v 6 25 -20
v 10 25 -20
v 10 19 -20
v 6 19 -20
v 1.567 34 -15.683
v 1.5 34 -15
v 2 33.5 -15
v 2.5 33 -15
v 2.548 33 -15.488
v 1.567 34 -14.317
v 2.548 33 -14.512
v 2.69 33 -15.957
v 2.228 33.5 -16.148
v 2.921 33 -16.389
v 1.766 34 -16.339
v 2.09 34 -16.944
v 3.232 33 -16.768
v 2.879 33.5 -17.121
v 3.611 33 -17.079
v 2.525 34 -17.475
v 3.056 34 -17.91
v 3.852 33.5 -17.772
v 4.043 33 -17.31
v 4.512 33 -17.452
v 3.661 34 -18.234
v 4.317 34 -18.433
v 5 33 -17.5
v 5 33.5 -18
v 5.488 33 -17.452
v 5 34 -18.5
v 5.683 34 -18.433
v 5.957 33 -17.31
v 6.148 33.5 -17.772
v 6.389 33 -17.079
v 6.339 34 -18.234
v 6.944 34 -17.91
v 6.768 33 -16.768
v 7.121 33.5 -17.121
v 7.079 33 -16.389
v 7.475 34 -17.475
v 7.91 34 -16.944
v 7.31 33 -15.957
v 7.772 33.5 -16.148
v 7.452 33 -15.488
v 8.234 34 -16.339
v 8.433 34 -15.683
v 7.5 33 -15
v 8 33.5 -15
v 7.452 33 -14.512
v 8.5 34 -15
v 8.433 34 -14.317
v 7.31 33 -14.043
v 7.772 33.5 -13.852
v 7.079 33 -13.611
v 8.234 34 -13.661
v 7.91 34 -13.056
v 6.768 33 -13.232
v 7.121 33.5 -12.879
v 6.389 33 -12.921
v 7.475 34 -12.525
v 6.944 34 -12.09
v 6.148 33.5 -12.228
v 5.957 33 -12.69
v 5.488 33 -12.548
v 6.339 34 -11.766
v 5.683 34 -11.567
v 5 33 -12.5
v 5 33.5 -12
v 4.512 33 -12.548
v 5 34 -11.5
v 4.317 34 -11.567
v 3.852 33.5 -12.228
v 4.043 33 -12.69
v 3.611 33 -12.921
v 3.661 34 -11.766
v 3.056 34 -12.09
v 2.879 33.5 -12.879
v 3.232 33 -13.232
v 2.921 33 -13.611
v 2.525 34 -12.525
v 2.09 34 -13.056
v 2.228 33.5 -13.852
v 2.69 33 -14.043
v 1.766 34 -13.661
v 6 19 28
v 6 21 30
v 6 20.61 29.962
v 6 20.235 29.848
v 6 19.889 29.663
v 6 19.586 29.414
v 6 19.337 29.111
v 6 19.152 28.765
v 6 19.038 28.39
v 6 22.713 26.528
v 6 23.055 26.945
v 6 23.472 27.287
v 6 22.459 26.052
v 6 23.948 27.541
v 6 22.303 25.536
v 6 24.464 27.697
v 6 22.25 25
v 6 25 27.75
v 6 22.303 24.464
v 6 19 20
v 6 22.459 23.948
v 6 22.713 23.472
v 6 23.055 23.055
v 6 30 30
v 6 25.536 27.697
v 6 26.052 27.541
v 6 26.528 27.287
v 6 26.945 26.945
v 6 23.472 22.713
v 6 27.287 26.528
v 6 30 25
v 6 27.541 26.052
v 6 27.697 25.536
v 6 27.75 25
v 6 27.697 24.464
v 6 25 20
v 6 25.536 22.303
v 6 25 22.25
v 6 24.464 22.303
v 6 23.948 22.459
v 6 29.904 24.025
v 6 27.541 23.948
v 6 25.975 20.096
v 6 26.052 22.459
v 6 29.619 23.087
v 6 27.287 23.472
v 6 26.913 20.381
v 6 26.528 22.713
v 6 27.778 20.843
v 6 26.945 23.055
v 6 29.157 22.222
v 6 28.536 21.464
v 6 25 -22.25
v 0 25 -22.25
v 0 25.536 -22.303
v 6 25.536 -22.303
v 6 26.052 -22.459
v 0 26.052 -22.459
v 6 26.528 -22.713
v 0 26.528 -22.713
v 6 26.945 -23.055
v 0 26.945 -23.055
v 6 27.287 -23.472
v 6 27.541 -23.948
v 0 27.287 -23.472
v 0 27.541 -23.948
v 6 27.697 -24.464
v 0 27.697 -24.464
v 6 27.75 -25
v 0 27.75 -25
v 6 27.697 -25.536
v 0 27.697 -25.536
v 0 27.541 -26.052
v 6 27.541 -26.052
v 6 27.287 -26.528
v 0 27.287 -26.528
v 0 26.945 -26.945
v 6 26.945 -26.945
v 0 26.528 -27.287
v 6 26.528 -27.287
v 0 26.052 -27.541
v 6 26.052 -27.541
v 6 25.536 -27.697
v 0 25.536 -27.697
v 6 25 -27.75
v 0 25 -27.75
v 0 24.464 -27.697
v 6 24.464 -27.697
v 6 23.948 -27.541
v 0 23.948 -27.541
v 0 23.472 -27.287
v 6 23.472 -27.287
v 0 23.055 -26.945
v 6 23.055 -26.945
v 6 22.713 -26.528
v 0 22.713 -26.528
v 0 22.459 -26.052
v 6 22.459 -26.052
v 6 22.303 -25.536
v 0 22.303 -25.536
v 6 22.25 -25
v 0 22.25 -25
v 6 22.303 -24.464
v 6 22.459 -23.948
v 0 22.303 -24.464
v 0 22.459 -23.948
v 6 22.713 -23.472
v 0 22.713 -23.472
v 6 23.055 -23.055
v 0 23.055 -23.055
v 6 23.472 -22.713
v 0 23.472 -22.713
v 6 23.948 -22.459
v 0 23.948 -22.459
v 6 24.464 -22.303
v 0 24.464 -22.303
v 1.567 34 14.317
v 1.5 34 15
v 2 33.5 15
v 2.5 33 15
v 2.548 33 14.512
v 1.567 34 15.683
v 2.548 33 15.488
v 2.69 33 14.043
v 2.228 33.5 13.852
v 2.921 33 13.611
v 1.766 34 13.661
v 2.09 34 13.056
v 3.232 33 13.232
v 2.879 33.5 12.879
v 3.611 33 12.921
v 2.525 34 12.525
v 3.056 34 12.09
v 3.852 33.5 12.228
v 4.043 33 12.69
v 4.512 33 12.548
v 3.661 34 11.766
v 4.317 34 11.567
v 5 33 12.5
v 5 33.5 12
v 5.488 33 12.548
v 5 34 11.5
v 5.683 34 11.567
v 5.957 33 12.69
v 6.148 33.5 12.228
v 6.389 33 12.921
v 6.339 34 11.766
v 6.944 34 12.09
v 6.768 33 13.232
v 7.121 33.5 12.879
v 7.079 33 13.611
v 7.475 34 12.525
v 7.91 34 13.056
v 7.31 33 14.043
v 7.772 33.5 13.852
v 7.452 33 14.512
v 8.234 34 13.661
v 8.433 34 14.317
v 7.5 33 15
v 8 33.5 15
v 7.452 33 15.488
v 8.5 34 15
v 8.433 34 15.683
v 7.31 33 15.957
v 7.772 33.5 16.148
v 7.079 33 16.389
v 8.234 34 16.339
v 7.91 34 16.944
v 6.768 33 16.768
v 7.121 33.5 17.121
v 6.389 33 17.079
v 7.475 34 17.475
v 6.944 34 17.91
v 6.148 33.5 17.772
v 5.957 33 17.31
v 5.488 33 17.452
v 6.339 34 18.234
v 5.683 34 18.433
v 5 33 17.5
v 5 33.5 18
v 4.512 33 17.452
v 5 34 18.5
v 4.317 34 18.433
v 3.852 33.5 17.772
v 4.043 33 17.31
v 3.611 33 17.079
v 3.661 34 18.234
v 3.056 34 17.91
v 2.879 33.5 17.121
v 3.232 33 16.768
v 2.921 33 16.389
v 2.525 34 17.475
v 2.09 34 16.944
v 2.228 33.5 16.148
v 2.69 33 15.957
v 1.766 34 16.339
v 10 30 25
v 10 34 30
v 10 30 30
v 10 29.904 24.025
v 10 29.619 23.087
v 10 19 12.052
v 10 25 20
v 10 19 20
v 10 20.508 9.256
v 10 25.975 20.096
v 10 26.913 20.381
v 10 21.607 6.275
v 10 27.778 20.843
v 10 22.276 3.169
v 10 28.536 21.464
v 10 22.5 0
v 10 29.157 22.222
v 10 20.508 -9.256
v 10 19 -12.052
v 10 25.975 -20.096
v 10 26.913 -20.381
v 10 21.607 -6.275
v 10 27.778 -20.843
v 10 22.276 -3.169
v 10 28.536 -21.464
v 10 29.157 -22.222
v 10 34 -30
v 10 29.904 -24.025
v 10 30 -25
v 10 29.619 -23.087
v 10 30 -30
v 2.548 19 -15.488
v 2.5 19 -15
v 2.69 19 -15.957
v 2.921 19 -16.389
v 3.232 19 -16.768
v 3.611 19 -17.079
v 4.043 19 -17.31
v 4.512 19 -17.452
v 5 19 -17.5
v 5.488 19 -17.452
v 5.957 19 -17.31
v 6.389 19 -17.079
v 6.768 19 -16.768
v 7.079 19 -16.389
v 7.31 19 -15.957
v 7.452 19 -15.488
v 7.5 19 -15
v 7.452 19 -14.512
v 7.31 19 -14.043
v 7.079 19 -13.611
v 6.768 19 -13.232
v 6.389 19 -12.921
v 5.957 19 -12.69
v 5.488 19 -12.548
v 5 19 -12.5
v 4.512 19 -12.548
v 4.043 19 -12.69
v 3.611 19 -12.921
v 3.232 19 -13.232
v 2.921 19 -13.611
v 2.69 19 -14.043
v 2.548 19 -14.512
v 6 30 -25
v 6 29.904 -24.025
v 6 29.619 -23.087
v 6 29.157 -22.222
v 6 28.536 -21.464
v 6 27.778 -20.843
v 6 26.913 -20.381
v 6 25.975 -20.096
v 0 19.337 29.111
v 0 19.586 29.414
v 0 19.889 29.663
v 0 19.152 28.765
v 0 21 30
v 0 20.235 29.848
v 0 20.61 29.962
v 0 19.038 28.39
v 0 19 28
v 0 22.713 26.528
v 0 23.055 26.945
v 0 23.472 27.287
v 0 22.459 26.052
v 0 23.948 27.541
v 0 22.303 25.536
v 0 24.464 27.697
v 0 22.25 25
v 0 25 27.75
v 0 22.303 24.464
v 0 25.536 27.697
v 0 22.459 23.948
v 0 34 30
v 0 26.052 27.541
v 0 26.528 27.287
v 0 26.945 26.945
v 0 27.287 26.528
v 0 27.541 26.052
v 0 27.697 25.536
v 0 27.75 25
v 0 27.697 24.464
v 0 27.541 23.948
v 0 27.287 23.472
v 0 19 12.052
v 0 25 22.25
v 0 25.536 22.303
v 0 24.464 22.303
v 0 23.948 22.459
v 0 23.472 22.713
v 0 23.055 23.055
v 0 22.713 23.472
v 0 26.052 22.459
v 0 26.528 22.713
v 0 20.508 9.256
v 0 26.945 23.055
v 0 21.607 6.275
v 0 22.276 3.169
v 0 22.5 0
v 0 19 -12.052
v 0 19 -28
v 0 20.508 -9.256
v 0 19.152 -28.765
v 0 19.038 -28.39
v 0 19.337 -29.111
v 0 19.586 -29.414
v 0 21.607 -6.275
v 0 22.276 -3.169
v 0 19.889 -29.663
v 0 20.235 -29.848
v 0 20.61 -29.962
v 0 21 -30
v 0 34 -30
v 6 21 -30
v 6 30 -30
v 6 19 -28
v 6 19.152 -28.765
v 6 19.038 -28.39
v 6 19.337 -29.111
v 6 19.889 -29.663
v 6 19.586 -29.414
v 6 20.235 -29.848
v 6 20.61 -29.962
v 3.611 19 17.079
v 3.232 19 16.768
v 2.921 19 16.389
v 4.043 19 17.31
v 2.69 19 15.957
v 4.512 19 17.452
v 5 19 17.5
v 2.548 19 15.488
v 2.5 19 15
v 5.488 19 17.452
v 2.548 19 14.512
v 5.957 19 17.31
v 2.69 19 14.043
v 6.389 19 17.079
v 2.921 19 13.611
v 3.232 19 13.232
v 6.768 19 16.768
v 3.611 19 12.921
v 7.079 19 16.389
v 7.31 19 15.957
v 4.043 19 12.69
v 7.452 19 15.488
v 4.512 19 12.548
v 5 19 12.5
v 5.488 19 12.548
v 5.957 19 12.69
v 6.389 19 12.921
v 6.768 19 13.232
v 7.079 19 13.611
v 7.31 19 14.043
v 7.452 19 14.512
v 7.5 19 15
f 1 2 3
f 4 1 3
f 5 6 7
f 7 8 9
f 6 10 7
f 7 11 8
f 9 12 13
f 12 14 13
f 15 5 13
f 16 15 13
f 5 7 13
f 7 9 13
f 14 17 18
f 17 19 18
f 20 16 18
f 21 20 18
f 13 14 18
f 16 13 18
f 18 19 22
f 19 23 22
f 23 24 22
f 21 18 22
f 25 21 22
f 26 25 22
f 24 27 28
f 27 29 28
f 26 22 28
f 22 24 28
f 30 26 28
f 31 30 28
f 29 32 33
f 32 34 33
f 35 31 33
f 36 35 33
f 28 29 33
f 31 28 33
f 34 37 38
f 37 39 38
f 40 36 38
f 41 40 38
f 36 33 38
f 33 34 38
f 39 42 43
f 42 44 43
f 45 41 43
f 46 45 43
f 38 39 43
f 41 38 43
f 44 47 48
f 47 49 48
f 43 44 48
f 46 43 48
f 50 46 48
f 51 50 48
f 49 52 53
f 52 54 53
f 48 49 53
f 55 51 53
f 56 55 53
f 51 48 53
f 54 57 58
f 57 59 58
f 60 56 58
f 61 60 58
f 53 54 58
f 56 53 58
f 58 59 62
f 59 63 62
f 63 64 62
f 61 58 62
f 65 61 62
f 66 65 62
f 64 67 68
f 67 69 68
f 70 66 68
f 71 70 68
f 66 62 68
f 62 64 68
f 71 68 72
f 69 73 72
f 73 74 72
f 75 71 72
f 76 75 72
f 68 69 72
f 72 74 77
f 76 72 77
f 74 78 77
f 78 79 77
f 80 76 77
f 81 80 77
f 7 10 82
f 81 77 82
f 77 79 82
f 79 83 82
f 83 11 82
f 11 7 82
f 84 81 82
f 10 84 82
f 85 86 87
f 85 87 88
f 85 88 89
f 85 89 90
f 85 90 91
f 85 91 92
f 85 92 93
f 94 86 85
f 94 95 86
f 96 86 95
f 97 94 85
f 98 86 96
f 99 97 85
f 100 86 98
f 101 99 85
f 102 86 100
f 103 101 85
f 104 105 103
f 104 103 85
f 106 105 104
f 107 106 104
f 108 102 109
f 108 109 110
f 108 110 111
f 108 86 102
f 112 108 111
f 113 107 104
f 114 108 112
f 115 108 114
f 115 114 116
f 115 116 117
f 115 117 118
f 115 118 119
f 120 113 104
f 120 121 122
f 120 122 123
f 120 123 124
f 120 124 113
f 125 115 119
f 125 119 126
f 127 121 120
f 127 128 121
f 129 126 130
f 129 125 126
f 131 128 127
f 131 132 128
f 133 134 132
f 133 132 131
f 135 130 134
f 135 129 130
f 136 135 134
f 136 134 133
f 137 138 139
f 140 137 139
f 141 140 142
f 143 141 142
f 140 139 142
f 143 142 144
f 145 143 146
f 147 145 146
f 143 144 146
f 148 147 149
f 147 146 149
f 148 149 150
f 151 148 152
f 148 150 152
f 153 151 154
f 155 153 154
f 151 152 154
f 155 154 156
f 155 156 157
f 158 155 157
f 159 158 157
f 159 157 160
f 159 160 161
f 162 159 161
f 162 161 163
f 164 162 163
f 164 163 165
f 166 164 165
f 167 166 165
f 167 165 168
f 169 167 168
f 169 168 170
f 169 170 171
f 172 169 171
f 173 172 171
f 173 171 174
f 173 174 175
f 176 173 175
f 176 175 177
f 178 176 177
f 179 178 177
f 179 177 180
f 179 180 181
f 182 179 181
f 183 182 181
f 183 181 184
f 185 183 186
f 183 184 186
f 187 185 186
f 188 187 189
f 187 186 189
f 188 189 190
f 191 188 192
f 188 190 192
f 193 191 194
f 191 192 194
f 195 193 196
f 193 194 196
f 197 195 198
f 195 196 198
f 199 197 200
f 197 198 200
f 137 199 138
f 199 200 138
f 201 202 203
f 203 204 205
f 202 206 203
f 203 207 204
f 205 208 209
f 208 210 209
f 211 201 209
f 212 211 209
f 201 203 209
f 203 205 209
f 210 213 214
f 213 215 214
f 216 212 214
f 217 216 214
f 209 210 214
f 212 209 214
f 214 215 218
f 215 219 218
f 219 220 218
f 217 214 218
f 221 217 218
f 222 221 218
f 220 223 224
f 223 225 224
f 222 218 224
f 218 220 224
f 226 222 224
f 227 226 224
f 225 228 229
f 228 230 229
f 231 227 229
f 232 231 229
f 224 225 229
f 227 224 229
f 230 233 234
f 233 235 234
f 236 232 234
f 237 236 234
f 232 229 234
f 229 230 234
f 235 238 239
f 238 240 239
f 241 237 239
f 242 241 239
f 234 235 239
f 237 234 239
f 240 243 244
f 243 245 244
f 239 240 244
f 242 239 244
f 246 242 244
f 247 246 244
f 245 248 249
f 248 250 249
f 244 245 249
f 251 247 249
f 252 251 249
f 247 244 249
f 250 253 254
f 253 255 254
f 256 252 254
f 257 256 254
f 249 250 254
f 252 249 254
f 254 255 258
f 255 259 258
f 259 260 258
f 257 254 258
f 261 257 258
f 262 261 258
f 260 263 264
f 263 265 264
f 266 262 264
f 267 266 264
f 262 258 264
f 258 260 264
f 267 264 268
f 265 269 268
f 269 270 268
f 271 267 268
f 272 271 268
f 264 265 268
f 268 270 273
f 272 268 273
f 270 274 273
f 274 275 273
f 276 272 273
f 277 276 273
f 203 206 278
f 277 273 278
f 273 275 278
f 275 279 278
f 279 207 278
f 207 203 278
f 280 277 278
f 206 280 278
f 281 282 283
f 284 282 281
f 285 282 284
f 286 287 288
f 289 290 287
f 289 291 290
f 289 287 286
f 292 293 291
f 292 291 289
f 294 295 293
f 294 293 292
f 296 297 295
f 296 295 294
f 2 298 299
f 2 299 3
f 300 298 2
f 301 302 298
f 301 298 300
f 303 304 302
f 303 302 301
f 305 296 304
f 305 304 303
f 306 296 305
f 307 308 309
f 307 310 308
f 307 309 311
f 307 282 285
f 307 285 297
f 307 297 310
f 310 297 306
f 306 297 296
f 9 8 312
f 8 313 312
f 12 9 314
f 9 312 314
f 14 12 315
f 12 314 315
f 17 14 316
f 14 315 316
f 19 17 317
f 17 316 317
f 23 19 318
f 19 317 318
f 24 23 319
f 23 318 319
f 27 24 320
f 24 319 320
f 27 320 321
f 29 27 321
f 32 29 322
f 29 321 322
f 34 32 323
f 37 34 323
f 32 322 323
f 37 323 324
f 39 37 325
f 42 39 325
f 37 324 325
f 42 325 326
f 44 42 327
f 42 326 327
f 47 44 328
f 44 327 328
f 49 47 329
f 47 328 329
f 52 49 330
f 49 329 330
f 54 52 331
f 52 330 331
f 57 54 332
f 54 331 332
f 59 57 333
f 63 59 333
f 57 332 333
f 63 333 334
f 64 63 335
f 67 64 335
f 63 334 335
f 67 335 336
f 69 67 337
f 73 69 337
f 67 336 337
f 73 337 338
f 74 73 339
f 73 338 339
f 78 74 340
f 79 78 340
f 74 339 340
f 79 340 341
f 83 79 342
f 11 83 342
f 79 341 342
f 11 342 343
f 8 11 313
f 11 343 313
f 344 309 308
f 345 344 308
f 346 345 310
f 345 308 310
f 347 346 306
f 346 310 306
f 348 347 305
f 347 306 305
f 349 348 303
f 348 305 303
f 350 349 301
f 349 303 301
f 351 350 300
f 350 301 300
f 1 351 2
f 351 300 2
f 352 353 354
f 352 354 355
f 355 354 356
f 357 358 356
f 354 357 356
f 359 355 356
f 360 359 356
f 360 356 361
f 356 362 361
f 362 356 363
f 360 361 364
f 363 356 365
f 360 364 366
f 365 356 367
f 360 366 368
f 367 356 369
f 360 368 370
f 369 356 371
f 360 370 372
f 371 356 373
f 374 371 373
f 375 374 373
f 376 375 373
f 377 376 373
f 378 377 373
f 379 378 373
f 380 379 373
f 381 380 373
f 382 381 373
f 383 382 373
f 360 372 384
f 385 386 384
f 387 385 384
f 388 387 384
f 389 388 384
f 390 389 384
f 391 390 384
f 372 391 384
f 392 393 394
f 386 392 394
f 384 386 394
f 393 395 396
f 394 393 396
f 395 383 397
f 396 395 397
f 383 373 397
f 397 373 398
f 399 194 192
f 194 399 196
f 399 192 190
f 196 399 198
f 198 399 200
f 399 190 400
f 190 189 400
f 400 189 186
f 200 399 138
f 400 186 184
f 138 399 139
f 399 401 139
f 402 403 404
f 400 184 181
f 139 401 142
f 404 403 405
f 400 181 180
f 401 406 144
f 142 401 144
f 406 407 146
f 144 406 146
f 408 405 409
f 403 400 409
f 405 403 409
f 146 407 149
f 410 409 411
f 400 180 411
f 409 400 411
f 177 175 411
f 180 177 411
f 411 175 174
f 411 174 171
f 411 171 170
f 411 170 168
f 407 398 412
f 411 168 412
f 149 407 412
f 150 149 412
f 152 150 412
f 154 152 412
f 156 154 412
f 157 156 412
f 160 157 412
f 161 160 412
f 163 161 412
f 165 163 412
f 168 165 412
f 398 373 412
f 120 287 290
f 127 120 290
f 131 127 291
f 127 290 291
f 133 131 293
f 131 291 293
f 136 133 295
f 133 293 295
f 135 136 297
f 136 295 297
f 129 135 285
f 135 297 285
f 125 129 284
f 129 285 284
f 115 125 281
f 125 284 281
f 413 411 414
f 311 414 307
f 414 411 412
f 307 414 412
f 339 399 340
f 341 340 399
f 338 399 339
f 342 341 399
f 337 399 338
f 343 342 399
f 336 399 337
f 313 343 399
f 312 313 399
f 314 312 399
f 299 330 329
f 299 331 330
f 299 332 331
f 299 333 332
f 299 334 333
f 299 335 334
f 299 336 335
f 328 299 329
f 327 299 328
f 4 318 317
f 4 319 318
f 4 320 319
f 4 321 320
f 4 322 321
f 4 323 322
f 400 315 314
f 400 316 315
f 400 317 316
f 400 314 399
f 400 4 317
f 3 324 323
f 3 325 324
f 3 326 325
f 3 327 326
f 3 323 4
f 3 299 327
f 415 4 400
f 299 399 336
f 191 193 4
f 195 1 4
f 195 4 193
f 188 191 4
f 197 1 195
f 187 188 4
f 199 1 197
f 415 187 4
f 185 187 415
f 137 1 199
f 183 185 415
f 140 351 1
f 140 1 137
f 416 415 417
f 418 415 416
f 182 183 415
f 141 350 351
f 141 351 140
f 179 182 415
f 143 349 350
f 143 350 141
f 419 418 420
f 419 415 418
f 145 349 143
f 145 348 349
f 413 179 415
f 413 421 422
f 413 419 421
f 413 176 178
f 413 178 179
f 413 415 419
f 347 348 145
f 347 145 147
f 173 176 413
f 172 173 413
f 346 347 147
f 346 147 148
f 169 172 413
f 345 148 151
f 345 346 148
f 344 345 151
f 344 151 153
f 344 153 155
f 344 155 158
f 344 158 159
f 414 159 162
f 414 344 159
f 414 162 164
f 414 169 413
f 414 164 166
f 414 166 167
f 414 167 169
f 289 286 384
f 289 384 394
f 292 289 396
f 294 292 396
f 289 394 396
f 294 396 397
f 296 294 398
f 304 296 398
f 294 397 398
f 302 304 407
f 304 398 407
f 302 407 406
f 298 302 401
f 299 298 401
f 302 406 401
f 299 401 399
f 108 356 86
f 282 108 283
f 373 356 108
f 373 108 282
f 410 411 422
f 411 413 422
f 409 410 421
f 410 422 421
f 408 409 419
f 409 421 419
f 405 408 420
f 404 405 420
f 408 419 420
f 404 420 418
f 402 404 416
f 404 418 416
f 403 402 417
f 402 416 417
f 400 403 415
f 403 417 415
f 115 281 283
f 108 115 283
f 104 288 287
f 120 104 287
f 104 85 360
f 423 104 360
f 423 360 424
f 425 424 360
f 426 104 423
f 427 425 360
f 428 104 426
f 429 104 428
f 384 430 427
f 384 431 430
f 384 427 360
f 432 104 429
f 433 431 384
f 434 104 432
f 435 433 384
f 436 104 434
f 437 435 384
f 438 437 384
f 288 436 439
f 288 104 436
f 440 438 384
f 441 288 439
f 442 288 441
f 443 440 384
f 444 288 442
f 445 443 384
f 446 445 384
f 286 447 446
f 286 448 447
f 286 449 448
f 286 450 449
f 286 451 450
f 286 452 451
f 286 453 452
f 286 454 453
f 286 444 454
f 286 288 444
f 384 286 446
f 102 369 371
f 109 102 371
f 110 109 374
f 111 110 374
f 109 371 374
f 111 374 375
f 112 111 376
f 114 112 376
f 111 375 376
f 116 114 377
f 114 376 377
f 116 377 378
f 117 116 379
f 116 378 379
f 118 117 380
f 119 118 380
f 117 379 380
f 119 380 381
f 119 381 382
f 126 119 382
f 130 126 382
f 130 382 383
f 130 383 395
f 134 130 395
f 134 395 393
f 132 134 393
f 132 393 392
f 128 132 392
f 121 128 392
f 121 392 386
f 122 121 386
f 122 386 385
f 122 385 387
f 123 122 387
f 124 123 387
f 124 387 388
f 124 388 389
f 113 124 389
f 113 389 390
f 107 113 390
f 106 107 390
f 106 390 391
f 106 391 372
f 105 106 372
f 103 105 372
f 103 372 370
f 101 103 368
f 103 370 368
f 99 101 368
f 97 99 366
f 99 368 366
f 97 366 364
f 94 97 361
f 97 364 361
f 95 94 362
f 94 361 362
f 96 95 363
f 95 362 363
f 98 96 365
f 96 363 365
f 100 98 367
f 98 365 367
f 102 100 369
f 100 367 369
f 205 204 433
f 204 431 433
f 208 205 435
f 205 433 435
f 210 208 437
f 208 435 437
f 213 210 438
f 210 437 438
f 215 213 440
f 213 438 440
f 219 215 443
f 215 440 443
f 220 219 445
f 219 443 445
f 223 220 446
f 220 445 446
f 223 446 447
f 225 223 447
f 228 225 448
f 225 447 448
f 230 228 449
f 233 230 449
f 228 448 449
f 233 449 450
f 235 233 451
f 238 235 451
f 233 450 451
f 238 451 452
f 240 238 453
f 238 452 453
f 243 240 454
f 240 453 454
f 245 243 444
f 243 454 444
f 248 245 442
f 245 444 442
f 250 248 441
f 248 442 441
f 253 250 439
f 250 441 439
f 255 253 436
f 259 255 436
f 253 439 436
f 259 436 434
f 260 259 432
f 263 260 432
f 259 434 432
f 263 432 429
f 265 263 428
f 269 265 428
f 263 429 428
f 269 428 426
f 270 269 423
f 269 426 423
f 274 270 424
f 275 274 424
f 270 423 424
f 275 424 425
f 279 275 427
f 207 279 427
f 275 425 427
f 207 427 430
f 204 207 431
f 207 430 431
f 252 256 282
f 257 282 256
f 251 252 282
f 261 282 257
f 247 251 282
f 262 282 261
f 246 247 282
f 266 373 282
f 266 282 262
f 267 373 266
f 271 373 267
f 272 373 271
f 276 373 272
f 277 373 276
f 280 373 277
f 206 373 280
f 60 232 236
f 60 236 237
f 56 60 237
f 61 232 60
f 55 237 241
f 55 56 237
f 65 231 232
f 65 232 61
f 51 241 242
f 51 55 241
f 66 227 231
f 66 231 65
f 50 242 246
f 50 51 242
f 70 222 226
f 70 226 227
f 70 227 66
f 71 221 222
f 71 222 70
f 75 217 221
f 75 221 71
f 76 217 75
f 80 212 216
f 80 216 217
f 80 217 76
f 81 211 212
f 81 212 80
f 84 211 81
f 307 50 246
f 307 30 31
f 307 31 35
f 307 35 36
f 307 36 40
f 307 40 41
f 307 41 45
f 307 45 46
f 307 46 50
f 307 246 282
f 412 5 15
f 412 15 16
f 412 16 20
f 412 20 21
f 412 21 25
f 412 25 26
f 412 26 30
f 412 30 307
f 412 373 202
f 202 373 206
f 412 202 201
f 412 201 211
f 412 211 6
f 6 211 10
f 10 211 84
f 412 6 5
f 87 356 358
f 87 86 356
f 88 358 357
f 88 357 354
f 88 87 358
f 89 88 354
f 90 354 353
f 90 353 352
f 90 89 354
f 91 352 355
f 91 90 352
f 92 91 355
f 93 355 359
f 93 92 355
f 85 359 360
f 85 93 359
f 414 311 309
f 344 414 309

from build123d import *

# Parameters (mm, degrees)
SKETCH_7_W                  = 60
SKETCH_7_H                  = 64
EXTRUDE_1_DEPTH             = 10
SKETCH_12_R                 = 22.5
CUT_EXTRUDE_6_DEPTH         = 10
SKETCH_11_W                 = 69.759203198
SKETCH_11_H                 = 53.938344997
CUT_EXTRUDE_5_DEPTH         = 10
HOLE_WIZARD_M51_D           = 5.5
HOLE_WIZARD_M61_D           = 5
HOLE_WIZARD_M61_CSINK_D     = 7
HOLE_WIZARD_M61_CSINK_ANGLE = 90
CUT_EXTRUDE_7_DEPTH         = 4
FILLET_1_R                  = 2


with BuildPart() as part:
    # Эскиз7 → Бобышка-Вытянуть1 (new body)
    with BuildSketch(Plane(origin=(0, 0, 0), x_dir=(0, 0, -1), z_dir=(1, 0, 0))):
        with Locations((0, 2)):
            Rectangle(SKETCH_7_W, SKETCH_7_H)
    extrude(amount=EXTRUDE_1_DEPTH)

    # Эскиз12 → Вырез-Вытянуть6 (cut)
    with BuildSketch(Plane.ZY):
        Circle(SKETCH_12_R)
    extrude(amount=-CUT_EXTRUDE_6_DEPTH, mode=Mode.SUBTRACT)

    # Эскиз11 → Вырез-Вытянуть5 (cut)
    with BuildSketch(Plane(origin=(10, 0, 0), x_dir=(0, 0, -1), z_dir=(1, 0, 0))):
        with Locations((0.089558527, -7.969172499)):
            Rectangle(SKETCH_11_W, SKETCH_11_H)
    extrude(amount=-CUT_EXTRUDE_5_DEPTH, mode=Mode.SUBTRACT)

    # Сверло под метчик  спиральное M51 (through all)
    with Locations(Plane(origin=(10, 0, 0), x_dir=(0, 0, -1), z_dir=(1, 0, 0))):
        with Locations((-25, 25), (25, 25)):
            Hole(HOLE_WIZARD_M51_D / 2)

    # Отверстие обработанное метчиком M61 (through all)
    with Locations(Plane(origin=(0, 34, 0), x_dir=(1, 0, 0), z_dir=(0, 1, 0))):
        with Locations((5, 15), (5, -15)):
            CounterSinkHole(HOLE_WIZARD_M61_D / 2, HOLE_WIZARD_M61_CSINK_D / 2, counter_sink_angle=HOLE_WIZARD_M61_CSINK_ANGLE)

    # Эскиз16 → Вырез-Вытянуть7 (cut)
    with BuildSketch(Plane(origin=(10, 0, 0), x_dir=(0, 0, -1), z_dir=(1, 0, 0))):
        with BuildLine():
            Line((-25, 30), (-30, 30))
            Line((-30, 30), (-30, 19))
            Line((-30, 19), (-20, 19))
            Line((-20, 19), (-20, 25))
            ThreePointArc((-20, 25), (-21.464466094, 28.535533906), (-25, 30))
        make_face()
        with BuildLine():
            Line((20, 25), (20, 19))
            Line((20, 19), (30, 19))
            Line((30, 19), (30, 30))
            Line((30, 30), (25, 30))
            ThreePointArc((25, 30), (21.464466094, 28.535533906), (20, 25))
        make_face()
    extrude(amount=-CUT_EXTRUDE_7_DEPTH, mode=Mode.SUBTRACT)

    # Скругление1
    fillet_1_edges = [part.edges().sort_by_distance(p)[0] for p in [
        (3, 19, 30),
        (3, 19, -30),
    ]]
    fillet(fillet_1_edges, radius=FILLET_1_R)


solid = part.part
